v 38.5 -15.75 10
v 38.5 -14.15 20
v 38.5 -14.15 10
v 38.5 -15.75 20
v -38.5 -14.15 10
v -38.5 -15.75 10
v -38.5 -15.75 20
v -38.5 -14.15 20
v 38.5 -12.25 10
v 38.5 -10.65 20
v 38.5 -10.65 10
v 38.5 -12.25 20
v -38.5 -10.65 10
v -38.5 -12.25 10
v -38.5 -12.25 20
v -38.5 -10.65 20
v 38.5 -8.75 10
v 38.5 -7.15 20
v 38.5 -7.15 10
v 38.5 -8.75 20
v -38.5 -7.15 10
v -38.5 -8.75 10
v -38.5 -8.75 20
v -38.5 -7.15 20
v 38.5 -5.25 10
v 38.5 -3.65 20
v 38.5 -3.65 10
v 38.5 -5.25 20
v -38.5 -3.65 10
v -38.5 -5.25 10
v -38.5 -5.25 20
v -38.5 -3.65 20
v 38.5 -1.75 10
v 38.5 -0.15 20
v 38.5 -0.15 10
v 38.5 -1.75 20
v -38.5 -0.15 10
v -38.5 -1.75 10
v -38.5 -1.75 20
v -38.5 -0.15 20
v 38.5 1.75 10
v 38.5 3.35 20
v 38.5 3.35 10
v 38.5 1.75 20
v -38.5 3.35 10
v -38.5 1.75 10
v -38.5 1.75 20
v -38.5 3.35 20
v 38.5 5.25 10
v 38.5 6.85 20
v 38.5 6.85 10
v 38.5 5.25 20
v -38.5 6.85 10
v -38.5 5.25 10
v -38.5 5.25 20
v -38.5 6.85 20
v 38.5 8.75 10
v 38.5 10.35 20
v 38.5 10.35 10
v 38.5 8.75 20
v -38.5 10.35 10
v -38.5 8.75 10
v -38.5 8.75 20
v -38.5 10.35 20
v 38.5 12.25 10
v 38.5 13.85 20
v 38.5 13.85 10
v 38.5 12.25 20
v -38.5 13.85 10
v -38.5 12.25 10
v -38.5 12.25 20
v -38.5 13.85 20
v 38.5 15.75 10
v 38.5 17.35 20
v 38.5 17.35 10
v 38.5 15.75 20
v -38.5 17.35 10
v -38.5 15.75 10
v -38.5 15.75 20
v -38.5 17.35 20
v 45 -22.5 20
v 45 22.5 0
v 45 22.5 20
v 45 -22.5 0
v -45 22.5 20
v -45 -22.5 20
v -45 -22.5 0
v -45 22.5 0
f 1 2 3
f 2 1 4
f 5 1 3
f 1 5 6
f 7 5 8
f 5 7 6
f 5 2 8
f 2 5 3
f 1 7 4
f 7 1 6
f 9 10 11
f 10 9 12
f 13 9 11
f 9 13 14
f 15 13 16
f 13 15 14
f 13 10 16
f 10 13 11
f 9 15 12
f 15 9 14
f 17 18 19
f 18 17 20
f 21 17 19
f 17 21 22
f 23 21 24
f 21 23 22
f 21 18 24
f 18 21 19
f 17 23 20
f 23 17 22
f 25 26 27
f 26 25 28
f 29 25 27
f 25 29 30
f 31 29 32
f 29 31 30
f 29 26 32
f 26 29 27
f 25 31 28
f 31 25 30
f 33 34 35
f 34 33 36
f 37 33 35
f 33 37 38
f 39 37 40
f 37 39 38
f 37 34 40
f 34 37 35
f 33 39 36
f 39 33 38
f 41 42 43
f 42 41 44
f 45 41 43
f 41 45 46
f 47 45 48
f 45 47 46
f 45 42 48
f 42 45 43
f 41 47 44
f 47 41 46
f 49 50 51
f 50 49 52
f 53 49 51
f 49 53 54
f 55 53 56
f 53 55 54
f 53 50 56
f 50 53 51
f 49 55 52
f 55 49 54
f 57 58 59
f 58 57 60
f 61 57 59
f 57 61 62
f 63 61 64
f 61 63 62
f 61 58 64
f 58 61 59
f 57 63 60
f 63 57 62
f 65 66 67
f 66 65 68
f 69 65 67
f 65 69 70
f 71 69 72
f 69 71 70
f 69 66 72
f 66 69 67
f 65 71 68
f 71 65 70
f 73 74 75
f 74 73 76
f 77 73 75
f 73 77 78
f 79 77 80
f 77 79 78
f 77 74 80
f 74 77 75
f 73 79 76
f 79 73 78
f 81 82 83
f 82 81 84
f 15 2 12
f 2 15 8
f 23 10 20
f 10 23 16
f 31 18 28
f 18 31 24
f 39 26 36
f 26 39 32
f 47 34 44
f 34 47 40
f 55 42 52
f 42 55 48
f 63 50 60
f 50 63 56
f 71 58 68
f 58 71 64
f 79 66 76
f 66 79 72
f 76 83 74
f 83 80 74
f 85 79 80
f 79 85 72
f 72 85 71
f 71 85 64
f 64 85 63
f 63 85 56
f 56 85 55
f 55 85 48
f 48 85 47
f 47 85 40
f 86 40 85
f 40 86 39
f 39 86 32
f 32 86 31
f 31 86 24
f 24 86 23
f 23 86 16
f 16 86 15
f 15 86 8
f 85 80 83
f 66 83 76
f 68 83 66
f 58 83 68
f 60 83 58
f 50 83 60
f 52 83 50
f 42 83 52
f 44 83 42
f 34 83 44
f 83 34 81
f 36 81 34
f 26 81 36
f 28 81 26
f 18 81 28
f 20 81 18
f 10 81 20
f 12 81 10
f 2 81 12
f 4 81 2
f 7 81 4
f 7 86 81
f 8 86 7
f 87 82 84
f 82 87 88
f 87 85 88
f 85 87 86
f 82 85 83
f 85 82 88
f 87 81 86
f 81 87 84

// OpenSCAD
// Microscope slide drying rack
// Units: mm

// ---- Block ----
block_len   = 90;    // X length
block_wid   = 45;    // Y width
block_ht    = 20;    // Z height

// ---- Slots ----
slot_count  = 10;    // number of slots
slot_len    = 77;    // slot length along X
slot_wid    = 1.6;   // slot width along Y
slot_depth  = 10;    // slot depth from top face
slot_pitch  = 3.5;   // centre-to-centre spacing along Y

// ---- Misc ----
eps         = 0.5;   // overshoot for clean cuts
$fn         = 64;

difference() {
    // Base block, centred in X/Y, resting on z = 0
    translate([-block_len/2, -block_wid/2, 0])
        cube([block_len, block_wid, block_ht]);

    // Slots, centred as a group in X and Y
    for (i = [0 : slot_count - 1]) {
        y = (i - (slot_count - 1)/2) * slot_pitch;
        translate([-slot_len/2, y, block_ht - slot_depth])
            cube([slot_len, slot_wid, slot_depth + eps]);
    }
}
